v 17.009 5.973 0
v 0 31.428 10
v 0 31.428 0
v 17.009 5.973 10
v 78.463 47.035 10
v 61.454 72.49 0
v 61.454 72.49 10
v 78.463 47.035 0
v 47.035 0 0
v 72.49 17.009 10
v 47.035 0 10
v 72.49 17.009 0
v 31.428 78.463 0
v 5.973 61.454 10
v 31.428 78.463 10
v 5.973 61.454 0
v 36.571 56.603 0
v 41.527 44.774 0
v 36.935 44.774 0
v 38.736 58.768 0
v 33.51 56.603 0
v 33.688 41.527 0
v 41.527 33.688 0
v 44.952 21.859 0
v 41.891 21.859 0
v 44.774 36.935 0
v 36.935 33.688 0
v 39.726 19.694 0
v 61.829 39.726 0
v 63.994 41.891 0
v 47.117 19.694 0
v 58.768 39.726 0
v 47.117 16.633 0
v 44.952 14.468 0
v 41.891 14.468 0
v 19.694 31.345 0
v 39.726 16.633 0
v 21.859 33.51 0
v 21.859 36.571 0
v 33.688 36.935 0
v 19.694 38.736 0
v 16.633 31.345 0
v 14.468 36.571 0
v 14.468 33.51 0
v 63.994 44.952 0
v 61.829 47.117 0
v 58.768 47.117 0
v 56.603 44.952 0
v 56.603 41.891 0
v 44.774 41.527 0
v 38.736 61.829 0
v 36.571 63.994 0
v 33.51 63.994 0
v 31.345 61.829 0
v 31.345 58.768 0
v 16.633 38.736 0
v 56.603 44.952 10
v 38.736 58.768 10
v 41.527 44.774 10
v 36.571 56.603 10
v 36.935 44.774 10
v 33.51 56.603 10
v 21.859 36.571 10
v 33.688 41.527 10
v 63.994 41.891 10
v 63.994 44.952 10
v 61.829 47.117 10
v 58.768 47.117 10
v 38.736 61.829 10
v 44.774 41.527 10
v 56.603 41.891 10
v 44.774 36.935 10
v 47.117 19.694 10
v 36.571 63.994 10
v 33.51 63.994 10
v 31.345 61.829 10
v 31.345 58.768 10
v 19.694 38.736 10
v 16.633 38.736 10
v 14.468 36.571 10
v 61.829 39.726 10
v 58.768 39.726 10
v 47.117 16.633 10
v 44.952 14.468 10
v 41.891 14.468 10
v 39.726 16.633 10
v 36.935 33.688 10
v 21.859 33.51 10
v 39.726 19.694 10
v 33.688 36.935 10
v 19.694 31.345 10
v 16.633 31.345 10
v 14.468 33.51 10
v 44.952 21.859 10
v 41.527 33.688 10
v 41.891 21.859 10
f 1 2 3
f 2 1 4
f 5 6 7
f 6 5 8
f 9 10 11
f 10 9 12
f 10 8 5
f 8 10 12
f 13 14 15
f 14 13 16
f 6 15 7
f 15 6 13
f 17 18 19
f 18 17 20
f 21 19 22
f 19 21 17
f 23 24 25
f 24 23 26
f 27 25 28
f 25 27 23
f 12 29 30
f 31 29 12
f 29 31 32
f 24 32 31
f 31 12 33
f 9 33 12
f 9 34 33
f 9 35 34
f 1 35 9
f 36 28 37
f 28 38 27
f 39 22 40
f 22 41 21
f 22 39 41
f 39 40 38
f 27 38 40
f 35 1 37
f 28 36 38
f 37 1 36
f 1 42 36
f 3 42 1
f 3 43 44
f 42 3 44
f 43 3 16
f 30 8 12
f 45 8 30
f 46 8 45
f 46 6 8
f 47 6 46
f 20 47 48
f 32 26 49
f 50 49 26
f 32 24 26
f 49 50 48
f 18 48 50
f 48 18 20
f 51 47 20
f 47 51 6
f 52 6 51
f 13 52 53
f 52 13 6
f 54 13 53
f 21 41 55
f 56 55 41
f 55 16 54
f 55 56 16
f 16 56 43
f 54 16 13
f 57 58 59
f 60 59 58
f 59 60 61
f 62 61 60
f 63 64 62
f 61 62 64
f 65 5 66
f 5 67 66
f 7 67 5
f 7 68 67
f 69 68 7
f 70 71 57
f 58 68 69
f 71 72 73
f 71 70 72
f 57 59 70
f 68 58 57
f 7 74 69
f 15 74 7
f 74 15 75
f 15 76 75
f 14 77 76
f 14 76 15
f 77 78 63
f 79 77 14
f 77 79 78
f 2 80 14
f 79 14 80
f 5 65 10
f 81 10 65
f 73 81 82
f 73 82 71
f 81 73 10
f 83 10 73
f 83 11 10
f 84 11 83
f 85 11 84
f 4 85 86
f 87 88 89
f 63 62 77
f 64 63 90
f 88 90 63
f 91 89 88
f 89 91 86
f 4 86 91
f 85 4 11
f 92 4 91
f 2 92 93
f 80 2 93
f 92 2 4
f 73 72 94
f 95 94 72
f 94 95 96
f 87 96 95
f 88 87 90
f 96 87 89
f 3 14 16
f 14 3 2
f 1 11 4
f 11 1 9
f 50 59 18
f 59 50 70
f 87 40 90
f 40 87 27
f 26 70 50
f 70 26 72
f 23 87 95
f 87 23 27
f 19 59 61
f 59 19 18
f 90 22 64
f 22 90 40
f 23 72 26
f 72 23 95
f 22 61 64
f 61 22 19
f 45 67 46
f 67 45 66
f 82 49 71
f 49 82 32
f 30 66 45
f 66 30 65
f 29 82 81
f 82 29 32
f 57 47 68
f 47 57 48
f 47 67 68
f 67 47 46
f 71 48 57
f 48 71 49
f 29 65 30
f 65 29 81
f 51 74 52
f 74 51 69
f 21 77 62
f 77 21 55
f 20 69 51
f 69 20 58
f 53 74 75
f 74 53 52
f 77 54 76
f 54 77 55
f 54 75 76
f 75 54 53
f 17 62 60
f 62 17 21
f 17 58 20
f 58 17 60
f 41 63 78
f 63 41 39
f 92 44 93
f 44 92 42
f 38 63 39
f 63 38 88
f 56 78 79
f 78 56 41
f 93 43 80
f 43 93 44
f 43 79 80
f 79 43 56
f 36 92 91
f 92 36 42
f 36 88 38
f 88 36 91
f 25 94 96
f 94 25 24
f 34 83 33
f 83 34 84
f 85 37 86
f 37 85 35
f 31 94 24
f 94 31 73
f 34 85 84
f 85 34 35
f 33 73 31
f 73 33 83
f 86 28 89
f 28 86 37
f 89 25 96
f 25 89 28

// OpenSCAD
$fn = 32;

// ----------------------------------------------------------------------
// Polygon plate: 8-gon R40, 4 bolt windows
// ----------------------------------------------------------------------

// --- parameters (mm) ---
sides = 8;                // number of polygon sides
plate_r = 40;             // circumscribed radius of the polygon
bore_r = 6;               // centre bore radius
bolts = 4;                // number of bolt windows
ring_r = 21.48;           // bolt-circle radius
bolt_r = 4;               // bolt window radius
plate_t = 10;             // plate thickness, Z (extrusion height)

plate_d = 2 * plate_r;  // circumscribed diameter
bore_d = 2 * bore_r;  // centre bore diameter
bolt_d = 2 * bolt_r;  // bolt window diameter
ring_d = 2 * ring_r;  // bolt-circle diameter

profile = [[78.463, 47.035], [61.454, 72.49], [31.428, 78.463], [5.973, 61.454], [0, 31.428], [17.009, 5.973], [47.035, 0], [72.49, 17.009]];  // primary outline, 8 points, counter clockwise
void_1 = [[44.774, 41.527], [41.527, 44.774], [36.935, 44.774], [33.688, 41.527], [33.688, 36.935], [36.935, 33.688], [41.527, 33.688], [44.774, 36.935]];  // centre bore, 8 points
void_2 = [[63.994, 44.952], [61.829, 47.117], [58.768, 47.117], [56.603, 44.952], [56.603, 41.891], [58.768, 39.726], [61.829, 39.726], [63.994, 41.891]];  // bolt window 1, 8 points
void_3 = [[38.736, 61.829], [36.571, 63.994], [33.51, 63.994], [31.345, 61.829], [31.345, 58.768], [33.51, 56.603], [36.571, 56.603], [38.736, 58.768]];  // bolt window 2, 8 points
void_4 = [[21.859, 36.571], [19.694, 38.736], [16.633, 38.736], [14.468, 36.571], [14.468, 33.51], [16.633, 31.345], [19.694, 31.345], [21.859, 33.51]];  // bolt window 3, 8 points
void_5 = [[47.117, 19.694], [44.952, 21.859], [41.891, 21.859], [39.726, 19.694], [39.726, 16.633], [41.891, 14.468], [44.952, 14.468], [47.117, 16.633]];  // bolt window 4, 8 points

// --- the one profile operation ---
difference() {
  linear_extrude(height = plate_t) polygon(points = profile);
  translate([0, 0, -1])
    linear_extrude(height = plate_t + 2) polygon(points = void_1);
  translate([0, 0, -1])
    linear_extrude(height = plate_t + 2) polygon(points = void_2);
  translate([0, 0, -1])
    linear_extrude(height = plate_t + 2) polygon(points = void_3);
  translate([0, 0, -1])
    linear_extrude(height = plate_t + 2) polygon(points = void_4);
  translate([0, 0, -1])
    linear_extrude(height = plate_t + 2) polygon(points = void_5);
}
